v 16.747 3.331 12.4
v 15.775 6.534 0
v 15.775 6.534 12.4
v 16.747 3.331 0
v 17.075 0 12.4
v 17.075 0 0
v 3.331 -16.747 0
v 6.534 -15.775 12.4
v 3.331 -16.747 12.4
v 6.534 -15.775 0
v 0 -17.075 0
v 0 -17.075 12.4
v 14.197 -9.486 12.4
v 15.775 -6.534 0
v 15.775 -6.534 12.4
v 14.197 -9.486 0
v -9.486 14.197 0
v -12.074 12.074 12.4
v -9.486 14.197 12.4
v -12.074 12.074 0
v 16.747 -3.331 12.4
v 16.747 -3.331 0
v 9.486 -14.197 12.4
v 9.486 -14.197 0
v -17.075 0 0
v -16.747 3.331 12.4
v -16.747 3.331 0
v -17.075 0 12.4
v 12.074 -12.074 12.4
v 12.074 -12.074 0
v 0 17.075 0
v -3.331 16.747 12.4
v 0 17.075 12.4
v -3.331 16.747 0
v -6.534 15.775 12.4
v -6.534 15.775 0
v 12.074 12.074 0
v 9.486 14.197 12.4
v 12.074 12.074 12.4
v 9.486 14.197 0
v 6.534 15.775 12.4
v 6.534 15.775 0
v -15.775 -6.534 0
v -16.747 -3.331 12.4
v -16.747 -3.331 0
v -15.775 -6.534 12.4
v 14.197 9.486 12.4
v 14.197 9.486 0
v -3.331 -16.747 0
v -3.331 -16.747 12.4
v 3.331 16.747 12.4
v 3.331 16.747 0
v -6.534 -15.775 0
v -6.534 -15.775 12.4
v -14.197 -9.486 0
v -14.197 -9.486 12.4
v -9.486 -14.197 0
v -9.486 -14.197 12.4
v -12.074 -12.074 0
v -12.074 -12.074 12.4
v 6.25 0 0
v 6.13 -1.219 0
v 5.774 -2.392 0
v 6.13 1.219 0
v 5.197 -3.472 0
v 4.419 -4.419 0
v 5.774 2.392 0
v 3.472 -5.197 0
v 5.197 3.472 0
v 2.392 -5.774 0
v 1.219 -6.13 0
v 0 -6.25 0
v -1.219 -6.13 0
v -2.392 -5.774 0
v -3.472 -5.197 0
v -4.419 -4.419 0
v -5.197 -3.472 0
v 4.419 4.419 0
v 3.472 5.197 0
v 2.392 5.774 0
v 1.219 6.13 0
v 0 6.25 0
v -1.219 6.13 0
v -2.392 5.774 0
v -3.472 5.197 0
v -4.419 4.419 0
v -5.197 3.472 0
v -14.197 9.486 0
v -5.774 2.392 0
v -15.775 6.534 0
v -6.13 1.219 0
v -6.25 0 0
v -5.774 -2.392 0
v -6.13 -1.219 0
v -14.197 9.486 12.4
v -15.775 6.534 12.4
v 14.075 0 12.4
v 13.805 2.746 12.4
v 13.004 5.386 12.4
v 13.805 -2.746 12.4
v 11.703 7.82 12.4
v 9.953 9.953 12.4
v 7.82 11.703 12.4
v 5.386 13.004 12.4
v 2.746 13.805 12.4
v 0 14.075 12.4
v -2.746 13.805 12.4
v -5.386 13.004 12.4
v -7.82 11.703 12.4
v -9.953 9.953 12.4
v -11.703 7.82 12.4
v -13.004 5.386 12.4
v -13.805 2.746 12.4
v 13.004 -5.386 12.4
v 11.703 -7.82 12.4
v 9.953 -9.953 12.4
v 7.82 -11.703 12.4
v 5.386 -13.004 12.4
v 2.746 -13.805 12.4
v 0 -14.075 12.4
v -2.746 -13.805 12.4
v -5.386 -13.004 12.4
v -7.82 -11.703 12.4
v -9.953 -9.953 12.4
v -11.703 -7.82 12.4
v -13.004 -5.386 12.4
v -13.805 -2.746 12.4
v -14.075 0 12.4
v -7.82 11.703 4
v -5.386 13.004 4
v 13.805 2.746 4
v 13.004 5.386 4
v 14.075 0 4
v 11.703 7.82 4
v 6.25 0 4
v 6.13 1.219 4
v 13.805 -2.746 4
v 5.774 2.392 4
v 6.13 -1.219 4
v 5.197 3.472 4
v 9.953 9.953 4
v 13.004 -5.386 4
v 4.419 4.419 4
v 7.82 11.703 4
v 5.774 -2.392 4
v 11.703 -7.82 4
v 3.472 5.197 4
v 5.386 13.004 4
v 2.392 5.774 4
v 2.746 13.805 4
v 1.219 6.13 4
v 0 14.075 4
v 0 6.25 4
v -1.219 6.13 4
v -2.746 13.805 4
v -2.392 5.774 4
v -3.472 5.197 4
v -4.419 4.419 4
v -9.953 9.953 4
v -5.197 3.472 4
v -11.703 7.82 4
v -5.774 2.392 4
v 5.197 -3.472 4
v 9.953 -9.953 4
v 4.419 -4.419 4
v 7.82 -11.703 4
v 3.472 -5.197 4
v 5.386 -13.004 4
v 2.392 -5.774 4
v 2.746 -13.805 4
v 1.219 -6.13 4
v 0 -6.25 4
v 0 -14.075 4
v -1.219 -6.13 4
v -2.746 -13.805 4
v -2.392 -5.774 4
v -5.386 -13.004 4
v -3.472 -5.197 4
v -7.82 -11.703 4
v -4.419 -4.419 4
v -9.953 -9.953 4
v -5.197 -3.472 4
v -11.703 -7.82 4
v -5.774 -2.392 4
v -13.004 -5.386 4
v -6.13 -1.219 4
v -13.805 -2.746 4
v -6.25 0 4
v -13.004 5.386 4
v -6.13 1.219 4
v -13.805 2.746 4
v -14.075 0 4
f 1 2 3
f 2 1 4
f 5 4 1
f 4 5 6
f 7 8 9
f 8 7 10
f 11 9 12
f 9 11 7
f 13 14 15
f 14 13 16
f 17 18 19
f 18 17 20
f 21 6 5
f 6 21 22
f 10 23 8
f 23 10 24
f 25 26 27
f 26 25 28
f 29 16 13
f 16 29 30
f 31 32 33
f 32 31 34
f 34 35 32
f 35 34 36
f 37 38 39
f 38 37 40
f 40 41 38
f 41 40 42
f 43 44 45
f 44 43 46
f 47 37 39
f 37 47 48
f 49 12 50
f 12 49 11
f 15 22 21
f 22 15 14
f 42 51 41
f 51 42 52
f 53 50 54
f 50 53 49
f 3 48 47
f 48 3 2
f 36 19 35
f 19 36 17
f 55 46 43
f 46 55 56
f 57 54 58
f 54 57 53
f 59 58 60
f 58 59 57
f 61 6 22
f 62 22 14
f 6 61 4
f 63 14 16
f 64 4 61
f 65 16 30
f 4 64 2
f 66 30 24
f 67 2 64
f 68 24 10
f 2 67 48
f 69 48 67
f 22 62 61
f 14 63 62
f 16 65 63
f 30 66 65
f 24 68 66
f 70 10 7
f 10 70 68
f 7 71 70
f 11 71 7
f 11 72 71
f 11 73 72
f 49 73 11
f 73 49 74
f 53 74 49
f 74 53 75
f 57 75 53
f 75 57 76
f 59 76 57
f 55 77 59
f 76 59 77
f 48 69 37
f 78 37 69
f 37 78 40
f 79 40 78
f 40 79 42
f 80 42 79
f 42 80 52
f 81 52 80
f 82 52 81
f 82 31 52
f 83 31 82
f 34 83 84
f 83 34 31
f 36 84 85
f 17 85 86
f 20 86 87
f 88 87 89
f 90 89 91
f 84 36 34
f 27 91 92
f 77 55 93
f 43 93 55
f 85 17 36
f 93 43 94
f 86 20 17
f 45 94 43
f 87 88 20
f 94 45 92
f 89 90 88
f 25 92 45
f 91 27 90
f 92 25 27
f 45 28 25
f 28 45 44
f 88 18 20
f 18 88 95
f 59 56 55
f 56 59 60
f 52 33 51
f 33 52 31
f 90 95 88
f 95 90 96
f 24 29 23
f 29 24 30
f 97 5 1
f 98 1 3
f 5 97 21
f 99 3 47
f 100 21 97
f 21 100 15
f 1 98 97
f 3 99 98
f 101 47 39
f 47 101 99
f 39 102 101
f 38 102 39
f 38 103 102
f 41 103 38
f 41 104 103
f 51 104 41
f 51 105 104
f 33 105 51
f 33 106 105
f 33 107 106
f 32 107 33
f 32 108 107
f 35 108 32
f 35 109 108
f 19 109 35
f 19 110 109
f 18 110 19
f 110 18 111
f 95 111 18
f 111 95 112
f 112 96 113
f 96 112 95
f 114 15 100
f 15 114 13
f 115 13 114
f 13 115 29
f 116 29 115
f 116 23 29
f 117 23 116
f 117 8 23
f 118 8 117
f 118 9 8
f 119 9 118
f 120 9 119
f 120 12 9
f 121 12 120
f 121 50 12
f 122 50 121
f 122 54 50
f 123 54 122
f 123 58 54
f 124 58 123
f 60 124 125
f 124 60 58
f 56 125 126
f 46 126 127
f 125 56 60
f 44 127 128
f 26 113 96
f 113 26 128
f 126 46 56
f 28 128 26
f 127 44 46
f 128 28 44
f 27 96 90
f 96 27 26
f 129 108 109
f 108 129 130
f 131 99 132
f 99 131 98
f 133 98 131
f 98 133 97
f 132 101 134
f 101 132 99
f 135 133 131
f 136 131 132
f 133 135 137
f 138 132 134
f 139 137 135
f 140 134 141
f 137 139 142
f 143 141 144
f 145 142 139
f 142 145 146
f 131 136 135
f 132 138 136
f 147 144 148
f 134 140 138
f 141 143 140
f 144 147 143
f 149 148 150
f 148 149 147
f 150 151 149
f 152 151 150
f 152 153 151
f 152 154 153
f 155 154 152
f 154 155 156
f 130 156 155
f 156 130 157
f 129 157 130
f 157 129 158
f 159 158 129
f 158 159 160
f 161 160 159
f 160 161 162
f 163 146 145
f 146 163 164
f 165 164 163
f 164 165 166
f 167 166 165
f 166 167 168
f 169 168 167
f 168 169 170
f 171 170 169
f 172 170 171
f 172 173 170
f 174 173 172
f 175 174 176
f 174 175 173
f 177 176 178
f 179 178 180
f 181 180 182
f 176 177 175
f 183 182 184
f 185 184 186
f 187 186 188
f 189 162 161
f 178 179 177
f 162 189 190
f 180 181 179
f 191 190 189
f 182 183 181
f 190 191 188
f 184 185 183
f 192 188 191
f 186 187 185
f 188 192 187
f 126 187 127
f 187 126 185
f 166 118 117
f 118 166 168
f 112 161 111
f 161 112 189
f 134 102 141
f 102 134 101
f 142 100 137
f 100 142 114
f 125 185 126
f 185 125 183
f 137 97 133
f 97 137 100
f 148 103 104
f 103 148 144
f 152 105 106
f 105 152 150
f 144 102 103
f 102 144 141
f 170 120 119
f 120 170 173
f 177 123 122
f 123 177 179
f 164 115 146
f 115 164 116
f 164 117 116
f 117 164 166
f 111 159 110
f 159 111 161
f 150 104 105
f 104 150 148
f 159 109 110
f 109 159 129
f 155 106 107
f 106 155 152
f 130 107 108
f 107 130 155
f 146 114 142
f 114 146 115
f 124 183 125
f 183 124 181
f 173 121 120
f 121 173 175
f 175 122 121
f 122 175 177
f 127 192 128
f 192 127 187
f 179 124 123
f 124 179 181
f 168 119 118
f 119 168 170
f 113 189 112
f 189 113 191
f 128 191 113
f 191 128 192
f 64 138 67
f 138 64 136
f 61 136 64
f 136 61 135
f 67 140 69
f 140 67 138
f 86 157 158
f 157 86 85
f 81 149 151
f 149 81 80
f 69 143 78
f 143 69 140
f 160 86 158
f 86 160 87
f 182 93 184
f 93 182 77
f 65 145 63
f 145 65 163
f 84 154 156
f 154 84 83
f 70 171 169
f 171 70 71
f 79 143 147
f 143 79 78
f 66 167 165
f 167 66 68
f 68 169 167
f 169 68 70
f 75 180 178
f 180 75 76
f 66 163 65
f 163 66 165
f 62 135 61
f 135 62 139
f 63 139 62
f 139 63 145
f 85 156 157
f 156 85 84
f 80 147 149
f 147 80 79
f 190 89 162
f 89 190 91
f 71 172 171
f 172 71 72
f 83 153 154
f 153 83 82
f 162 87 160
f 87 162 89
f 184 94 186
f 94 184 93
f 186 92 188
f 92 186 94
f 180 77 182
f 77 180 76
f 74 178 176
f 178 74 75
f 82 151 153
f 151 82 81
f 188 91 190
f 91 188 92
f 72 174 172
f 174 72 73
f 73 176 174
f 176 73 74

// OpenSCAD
$fn = 32;

// ----------------------------------------------------------------------
// Bearing housing: seat for 6001 (28 x 8 mm), 34.15 mm body
// ----------------------------------------------------------------------

// --- parameters (mm) ---
housing_d = 34.15;        // housing outside diameter
housing_h = 12.4;         // overall housing height
wall_t = 3;               // wall thickness
seat_d = 28.15;           // 6001 seat, 0.15 mm clearance
seat_h = 8.4;             // pocket depth
shoulder = 4;             // shoulder under the bearing
pass_d = 12.5;            // shaft passage

module body() {
  cylinder(h = housing_h, d = housing_d);
}

difference() {
  union() {
    body();
  }
  translate([0, 0, housing_h - seat_h]) cylinder(h = seat_h + 1, d = seat_d);
  translate([0, 0, -1]) cylinder(h = housing_h - seat_h + 1, d = pass_d);
}
